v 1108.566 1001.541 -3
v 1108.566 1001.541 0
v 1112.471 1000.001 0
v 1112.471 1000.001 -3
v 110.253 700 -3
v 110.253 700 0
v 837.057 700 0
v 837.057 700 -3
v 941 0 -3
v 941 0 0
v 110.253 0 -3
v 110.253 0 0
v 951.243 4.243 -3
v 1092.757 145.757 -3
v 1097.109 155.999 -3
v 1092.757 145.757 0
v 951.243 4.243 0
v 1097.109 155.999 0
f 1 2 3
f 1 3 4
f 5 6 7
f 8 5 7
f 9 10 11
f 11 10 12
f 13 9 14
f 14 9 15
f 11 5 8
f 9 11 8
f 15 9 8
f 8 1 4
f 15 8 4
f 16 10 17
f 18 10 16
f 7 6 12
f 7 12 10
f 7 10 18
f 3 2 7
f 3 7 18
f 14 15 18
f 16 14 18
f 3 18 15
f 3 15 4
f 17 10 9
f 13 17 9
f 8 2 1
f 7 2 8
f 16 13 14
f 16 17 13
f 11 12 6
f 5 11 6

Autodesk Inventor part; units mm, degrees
ref_plane "YZ Plane" through (0, 0, 0) normal (1, 0, 0) x (0, 1, 0)
ref_plane "XZ Plane" through (0, 0, 0) normal (0, 1, 0) x (-1, 0, 0)
ref_plane "XY Plane" through (0, 0, 0) normal (0, 0, 1) x (1, 0, 0)
sketch "Sketch8" plane through (0, 0, 0) normal (0, 0, 1) x (1, 0, 0)
  line L0 (0, 2897) -> (1200, 2897)
  line L1 (1200, 2897) -> (1200, 0)
  line L2 (1200, 0) -> (0, 0)
  line L3 (0, 0) -> (0, 2897)
  line L4 (0, 2897) -> (1200, 0) construction
  line L5 (1200, 2897) -> (0, 0) construction
  line L6 (947, 0) -> (1097, 150)
  line L7 (1097, 150) -> (1147, 2897)
  line L8 (0, 700) -> (1200, 700)
  line L9 (1112.5806, 1006) -> (837.057, 700)
  line L10 (110.253, 0) -> (110.253, 700)
  point P0 (600, 1448.5)
  point P1 (1107.0109, 700)
  dimension "d43" = 1200
  dimension "d44" = 2897
  dimension "d45" = 53
  dimension "d46" = 947
  dimension "d47" = 150
  dimension "d48" = 103
  dimension "d49" = 700
  dimension "d55" = 306
  dimension "d57" = 110.253
  dimension "d61" = 48
extrude "Plate4" add sketch "Sketch8" against normal blind 3 contours L7 L8 L9 | L8 L7 L6 L2 L10
chamfer "Corner Chamfer1" distance 6 angle 45 2 edges at (947, 0, -1.5) (1097, 150, -1.5)
chamfer "Corner Chamfer2" distance 6 angle 45 1 edges at (1112.5806, 1006, -1.5)
equation "\"d50\" = Thickness"
equation "\"BendReliefWidth\" = Thickness"
equation "\"BendReliefDepth\" = 0.5 * Thickness"
equation "\"CornerReliefSize\" = 4 * Thickness"
equation "\"MinimumRemnant\" = 2 * Thickness"
equation "\"TransitionRadius\" = BendRadius"
equation "\"JacobiRadiusSize\" = BendRadius"
equation "\"GapSize\" = Thickness"
equation "\"Thickness\" = 3"
equation "\"BendRadius\" = 5"
properties part number "BSH 015 board cone 5" material "09g2s"
